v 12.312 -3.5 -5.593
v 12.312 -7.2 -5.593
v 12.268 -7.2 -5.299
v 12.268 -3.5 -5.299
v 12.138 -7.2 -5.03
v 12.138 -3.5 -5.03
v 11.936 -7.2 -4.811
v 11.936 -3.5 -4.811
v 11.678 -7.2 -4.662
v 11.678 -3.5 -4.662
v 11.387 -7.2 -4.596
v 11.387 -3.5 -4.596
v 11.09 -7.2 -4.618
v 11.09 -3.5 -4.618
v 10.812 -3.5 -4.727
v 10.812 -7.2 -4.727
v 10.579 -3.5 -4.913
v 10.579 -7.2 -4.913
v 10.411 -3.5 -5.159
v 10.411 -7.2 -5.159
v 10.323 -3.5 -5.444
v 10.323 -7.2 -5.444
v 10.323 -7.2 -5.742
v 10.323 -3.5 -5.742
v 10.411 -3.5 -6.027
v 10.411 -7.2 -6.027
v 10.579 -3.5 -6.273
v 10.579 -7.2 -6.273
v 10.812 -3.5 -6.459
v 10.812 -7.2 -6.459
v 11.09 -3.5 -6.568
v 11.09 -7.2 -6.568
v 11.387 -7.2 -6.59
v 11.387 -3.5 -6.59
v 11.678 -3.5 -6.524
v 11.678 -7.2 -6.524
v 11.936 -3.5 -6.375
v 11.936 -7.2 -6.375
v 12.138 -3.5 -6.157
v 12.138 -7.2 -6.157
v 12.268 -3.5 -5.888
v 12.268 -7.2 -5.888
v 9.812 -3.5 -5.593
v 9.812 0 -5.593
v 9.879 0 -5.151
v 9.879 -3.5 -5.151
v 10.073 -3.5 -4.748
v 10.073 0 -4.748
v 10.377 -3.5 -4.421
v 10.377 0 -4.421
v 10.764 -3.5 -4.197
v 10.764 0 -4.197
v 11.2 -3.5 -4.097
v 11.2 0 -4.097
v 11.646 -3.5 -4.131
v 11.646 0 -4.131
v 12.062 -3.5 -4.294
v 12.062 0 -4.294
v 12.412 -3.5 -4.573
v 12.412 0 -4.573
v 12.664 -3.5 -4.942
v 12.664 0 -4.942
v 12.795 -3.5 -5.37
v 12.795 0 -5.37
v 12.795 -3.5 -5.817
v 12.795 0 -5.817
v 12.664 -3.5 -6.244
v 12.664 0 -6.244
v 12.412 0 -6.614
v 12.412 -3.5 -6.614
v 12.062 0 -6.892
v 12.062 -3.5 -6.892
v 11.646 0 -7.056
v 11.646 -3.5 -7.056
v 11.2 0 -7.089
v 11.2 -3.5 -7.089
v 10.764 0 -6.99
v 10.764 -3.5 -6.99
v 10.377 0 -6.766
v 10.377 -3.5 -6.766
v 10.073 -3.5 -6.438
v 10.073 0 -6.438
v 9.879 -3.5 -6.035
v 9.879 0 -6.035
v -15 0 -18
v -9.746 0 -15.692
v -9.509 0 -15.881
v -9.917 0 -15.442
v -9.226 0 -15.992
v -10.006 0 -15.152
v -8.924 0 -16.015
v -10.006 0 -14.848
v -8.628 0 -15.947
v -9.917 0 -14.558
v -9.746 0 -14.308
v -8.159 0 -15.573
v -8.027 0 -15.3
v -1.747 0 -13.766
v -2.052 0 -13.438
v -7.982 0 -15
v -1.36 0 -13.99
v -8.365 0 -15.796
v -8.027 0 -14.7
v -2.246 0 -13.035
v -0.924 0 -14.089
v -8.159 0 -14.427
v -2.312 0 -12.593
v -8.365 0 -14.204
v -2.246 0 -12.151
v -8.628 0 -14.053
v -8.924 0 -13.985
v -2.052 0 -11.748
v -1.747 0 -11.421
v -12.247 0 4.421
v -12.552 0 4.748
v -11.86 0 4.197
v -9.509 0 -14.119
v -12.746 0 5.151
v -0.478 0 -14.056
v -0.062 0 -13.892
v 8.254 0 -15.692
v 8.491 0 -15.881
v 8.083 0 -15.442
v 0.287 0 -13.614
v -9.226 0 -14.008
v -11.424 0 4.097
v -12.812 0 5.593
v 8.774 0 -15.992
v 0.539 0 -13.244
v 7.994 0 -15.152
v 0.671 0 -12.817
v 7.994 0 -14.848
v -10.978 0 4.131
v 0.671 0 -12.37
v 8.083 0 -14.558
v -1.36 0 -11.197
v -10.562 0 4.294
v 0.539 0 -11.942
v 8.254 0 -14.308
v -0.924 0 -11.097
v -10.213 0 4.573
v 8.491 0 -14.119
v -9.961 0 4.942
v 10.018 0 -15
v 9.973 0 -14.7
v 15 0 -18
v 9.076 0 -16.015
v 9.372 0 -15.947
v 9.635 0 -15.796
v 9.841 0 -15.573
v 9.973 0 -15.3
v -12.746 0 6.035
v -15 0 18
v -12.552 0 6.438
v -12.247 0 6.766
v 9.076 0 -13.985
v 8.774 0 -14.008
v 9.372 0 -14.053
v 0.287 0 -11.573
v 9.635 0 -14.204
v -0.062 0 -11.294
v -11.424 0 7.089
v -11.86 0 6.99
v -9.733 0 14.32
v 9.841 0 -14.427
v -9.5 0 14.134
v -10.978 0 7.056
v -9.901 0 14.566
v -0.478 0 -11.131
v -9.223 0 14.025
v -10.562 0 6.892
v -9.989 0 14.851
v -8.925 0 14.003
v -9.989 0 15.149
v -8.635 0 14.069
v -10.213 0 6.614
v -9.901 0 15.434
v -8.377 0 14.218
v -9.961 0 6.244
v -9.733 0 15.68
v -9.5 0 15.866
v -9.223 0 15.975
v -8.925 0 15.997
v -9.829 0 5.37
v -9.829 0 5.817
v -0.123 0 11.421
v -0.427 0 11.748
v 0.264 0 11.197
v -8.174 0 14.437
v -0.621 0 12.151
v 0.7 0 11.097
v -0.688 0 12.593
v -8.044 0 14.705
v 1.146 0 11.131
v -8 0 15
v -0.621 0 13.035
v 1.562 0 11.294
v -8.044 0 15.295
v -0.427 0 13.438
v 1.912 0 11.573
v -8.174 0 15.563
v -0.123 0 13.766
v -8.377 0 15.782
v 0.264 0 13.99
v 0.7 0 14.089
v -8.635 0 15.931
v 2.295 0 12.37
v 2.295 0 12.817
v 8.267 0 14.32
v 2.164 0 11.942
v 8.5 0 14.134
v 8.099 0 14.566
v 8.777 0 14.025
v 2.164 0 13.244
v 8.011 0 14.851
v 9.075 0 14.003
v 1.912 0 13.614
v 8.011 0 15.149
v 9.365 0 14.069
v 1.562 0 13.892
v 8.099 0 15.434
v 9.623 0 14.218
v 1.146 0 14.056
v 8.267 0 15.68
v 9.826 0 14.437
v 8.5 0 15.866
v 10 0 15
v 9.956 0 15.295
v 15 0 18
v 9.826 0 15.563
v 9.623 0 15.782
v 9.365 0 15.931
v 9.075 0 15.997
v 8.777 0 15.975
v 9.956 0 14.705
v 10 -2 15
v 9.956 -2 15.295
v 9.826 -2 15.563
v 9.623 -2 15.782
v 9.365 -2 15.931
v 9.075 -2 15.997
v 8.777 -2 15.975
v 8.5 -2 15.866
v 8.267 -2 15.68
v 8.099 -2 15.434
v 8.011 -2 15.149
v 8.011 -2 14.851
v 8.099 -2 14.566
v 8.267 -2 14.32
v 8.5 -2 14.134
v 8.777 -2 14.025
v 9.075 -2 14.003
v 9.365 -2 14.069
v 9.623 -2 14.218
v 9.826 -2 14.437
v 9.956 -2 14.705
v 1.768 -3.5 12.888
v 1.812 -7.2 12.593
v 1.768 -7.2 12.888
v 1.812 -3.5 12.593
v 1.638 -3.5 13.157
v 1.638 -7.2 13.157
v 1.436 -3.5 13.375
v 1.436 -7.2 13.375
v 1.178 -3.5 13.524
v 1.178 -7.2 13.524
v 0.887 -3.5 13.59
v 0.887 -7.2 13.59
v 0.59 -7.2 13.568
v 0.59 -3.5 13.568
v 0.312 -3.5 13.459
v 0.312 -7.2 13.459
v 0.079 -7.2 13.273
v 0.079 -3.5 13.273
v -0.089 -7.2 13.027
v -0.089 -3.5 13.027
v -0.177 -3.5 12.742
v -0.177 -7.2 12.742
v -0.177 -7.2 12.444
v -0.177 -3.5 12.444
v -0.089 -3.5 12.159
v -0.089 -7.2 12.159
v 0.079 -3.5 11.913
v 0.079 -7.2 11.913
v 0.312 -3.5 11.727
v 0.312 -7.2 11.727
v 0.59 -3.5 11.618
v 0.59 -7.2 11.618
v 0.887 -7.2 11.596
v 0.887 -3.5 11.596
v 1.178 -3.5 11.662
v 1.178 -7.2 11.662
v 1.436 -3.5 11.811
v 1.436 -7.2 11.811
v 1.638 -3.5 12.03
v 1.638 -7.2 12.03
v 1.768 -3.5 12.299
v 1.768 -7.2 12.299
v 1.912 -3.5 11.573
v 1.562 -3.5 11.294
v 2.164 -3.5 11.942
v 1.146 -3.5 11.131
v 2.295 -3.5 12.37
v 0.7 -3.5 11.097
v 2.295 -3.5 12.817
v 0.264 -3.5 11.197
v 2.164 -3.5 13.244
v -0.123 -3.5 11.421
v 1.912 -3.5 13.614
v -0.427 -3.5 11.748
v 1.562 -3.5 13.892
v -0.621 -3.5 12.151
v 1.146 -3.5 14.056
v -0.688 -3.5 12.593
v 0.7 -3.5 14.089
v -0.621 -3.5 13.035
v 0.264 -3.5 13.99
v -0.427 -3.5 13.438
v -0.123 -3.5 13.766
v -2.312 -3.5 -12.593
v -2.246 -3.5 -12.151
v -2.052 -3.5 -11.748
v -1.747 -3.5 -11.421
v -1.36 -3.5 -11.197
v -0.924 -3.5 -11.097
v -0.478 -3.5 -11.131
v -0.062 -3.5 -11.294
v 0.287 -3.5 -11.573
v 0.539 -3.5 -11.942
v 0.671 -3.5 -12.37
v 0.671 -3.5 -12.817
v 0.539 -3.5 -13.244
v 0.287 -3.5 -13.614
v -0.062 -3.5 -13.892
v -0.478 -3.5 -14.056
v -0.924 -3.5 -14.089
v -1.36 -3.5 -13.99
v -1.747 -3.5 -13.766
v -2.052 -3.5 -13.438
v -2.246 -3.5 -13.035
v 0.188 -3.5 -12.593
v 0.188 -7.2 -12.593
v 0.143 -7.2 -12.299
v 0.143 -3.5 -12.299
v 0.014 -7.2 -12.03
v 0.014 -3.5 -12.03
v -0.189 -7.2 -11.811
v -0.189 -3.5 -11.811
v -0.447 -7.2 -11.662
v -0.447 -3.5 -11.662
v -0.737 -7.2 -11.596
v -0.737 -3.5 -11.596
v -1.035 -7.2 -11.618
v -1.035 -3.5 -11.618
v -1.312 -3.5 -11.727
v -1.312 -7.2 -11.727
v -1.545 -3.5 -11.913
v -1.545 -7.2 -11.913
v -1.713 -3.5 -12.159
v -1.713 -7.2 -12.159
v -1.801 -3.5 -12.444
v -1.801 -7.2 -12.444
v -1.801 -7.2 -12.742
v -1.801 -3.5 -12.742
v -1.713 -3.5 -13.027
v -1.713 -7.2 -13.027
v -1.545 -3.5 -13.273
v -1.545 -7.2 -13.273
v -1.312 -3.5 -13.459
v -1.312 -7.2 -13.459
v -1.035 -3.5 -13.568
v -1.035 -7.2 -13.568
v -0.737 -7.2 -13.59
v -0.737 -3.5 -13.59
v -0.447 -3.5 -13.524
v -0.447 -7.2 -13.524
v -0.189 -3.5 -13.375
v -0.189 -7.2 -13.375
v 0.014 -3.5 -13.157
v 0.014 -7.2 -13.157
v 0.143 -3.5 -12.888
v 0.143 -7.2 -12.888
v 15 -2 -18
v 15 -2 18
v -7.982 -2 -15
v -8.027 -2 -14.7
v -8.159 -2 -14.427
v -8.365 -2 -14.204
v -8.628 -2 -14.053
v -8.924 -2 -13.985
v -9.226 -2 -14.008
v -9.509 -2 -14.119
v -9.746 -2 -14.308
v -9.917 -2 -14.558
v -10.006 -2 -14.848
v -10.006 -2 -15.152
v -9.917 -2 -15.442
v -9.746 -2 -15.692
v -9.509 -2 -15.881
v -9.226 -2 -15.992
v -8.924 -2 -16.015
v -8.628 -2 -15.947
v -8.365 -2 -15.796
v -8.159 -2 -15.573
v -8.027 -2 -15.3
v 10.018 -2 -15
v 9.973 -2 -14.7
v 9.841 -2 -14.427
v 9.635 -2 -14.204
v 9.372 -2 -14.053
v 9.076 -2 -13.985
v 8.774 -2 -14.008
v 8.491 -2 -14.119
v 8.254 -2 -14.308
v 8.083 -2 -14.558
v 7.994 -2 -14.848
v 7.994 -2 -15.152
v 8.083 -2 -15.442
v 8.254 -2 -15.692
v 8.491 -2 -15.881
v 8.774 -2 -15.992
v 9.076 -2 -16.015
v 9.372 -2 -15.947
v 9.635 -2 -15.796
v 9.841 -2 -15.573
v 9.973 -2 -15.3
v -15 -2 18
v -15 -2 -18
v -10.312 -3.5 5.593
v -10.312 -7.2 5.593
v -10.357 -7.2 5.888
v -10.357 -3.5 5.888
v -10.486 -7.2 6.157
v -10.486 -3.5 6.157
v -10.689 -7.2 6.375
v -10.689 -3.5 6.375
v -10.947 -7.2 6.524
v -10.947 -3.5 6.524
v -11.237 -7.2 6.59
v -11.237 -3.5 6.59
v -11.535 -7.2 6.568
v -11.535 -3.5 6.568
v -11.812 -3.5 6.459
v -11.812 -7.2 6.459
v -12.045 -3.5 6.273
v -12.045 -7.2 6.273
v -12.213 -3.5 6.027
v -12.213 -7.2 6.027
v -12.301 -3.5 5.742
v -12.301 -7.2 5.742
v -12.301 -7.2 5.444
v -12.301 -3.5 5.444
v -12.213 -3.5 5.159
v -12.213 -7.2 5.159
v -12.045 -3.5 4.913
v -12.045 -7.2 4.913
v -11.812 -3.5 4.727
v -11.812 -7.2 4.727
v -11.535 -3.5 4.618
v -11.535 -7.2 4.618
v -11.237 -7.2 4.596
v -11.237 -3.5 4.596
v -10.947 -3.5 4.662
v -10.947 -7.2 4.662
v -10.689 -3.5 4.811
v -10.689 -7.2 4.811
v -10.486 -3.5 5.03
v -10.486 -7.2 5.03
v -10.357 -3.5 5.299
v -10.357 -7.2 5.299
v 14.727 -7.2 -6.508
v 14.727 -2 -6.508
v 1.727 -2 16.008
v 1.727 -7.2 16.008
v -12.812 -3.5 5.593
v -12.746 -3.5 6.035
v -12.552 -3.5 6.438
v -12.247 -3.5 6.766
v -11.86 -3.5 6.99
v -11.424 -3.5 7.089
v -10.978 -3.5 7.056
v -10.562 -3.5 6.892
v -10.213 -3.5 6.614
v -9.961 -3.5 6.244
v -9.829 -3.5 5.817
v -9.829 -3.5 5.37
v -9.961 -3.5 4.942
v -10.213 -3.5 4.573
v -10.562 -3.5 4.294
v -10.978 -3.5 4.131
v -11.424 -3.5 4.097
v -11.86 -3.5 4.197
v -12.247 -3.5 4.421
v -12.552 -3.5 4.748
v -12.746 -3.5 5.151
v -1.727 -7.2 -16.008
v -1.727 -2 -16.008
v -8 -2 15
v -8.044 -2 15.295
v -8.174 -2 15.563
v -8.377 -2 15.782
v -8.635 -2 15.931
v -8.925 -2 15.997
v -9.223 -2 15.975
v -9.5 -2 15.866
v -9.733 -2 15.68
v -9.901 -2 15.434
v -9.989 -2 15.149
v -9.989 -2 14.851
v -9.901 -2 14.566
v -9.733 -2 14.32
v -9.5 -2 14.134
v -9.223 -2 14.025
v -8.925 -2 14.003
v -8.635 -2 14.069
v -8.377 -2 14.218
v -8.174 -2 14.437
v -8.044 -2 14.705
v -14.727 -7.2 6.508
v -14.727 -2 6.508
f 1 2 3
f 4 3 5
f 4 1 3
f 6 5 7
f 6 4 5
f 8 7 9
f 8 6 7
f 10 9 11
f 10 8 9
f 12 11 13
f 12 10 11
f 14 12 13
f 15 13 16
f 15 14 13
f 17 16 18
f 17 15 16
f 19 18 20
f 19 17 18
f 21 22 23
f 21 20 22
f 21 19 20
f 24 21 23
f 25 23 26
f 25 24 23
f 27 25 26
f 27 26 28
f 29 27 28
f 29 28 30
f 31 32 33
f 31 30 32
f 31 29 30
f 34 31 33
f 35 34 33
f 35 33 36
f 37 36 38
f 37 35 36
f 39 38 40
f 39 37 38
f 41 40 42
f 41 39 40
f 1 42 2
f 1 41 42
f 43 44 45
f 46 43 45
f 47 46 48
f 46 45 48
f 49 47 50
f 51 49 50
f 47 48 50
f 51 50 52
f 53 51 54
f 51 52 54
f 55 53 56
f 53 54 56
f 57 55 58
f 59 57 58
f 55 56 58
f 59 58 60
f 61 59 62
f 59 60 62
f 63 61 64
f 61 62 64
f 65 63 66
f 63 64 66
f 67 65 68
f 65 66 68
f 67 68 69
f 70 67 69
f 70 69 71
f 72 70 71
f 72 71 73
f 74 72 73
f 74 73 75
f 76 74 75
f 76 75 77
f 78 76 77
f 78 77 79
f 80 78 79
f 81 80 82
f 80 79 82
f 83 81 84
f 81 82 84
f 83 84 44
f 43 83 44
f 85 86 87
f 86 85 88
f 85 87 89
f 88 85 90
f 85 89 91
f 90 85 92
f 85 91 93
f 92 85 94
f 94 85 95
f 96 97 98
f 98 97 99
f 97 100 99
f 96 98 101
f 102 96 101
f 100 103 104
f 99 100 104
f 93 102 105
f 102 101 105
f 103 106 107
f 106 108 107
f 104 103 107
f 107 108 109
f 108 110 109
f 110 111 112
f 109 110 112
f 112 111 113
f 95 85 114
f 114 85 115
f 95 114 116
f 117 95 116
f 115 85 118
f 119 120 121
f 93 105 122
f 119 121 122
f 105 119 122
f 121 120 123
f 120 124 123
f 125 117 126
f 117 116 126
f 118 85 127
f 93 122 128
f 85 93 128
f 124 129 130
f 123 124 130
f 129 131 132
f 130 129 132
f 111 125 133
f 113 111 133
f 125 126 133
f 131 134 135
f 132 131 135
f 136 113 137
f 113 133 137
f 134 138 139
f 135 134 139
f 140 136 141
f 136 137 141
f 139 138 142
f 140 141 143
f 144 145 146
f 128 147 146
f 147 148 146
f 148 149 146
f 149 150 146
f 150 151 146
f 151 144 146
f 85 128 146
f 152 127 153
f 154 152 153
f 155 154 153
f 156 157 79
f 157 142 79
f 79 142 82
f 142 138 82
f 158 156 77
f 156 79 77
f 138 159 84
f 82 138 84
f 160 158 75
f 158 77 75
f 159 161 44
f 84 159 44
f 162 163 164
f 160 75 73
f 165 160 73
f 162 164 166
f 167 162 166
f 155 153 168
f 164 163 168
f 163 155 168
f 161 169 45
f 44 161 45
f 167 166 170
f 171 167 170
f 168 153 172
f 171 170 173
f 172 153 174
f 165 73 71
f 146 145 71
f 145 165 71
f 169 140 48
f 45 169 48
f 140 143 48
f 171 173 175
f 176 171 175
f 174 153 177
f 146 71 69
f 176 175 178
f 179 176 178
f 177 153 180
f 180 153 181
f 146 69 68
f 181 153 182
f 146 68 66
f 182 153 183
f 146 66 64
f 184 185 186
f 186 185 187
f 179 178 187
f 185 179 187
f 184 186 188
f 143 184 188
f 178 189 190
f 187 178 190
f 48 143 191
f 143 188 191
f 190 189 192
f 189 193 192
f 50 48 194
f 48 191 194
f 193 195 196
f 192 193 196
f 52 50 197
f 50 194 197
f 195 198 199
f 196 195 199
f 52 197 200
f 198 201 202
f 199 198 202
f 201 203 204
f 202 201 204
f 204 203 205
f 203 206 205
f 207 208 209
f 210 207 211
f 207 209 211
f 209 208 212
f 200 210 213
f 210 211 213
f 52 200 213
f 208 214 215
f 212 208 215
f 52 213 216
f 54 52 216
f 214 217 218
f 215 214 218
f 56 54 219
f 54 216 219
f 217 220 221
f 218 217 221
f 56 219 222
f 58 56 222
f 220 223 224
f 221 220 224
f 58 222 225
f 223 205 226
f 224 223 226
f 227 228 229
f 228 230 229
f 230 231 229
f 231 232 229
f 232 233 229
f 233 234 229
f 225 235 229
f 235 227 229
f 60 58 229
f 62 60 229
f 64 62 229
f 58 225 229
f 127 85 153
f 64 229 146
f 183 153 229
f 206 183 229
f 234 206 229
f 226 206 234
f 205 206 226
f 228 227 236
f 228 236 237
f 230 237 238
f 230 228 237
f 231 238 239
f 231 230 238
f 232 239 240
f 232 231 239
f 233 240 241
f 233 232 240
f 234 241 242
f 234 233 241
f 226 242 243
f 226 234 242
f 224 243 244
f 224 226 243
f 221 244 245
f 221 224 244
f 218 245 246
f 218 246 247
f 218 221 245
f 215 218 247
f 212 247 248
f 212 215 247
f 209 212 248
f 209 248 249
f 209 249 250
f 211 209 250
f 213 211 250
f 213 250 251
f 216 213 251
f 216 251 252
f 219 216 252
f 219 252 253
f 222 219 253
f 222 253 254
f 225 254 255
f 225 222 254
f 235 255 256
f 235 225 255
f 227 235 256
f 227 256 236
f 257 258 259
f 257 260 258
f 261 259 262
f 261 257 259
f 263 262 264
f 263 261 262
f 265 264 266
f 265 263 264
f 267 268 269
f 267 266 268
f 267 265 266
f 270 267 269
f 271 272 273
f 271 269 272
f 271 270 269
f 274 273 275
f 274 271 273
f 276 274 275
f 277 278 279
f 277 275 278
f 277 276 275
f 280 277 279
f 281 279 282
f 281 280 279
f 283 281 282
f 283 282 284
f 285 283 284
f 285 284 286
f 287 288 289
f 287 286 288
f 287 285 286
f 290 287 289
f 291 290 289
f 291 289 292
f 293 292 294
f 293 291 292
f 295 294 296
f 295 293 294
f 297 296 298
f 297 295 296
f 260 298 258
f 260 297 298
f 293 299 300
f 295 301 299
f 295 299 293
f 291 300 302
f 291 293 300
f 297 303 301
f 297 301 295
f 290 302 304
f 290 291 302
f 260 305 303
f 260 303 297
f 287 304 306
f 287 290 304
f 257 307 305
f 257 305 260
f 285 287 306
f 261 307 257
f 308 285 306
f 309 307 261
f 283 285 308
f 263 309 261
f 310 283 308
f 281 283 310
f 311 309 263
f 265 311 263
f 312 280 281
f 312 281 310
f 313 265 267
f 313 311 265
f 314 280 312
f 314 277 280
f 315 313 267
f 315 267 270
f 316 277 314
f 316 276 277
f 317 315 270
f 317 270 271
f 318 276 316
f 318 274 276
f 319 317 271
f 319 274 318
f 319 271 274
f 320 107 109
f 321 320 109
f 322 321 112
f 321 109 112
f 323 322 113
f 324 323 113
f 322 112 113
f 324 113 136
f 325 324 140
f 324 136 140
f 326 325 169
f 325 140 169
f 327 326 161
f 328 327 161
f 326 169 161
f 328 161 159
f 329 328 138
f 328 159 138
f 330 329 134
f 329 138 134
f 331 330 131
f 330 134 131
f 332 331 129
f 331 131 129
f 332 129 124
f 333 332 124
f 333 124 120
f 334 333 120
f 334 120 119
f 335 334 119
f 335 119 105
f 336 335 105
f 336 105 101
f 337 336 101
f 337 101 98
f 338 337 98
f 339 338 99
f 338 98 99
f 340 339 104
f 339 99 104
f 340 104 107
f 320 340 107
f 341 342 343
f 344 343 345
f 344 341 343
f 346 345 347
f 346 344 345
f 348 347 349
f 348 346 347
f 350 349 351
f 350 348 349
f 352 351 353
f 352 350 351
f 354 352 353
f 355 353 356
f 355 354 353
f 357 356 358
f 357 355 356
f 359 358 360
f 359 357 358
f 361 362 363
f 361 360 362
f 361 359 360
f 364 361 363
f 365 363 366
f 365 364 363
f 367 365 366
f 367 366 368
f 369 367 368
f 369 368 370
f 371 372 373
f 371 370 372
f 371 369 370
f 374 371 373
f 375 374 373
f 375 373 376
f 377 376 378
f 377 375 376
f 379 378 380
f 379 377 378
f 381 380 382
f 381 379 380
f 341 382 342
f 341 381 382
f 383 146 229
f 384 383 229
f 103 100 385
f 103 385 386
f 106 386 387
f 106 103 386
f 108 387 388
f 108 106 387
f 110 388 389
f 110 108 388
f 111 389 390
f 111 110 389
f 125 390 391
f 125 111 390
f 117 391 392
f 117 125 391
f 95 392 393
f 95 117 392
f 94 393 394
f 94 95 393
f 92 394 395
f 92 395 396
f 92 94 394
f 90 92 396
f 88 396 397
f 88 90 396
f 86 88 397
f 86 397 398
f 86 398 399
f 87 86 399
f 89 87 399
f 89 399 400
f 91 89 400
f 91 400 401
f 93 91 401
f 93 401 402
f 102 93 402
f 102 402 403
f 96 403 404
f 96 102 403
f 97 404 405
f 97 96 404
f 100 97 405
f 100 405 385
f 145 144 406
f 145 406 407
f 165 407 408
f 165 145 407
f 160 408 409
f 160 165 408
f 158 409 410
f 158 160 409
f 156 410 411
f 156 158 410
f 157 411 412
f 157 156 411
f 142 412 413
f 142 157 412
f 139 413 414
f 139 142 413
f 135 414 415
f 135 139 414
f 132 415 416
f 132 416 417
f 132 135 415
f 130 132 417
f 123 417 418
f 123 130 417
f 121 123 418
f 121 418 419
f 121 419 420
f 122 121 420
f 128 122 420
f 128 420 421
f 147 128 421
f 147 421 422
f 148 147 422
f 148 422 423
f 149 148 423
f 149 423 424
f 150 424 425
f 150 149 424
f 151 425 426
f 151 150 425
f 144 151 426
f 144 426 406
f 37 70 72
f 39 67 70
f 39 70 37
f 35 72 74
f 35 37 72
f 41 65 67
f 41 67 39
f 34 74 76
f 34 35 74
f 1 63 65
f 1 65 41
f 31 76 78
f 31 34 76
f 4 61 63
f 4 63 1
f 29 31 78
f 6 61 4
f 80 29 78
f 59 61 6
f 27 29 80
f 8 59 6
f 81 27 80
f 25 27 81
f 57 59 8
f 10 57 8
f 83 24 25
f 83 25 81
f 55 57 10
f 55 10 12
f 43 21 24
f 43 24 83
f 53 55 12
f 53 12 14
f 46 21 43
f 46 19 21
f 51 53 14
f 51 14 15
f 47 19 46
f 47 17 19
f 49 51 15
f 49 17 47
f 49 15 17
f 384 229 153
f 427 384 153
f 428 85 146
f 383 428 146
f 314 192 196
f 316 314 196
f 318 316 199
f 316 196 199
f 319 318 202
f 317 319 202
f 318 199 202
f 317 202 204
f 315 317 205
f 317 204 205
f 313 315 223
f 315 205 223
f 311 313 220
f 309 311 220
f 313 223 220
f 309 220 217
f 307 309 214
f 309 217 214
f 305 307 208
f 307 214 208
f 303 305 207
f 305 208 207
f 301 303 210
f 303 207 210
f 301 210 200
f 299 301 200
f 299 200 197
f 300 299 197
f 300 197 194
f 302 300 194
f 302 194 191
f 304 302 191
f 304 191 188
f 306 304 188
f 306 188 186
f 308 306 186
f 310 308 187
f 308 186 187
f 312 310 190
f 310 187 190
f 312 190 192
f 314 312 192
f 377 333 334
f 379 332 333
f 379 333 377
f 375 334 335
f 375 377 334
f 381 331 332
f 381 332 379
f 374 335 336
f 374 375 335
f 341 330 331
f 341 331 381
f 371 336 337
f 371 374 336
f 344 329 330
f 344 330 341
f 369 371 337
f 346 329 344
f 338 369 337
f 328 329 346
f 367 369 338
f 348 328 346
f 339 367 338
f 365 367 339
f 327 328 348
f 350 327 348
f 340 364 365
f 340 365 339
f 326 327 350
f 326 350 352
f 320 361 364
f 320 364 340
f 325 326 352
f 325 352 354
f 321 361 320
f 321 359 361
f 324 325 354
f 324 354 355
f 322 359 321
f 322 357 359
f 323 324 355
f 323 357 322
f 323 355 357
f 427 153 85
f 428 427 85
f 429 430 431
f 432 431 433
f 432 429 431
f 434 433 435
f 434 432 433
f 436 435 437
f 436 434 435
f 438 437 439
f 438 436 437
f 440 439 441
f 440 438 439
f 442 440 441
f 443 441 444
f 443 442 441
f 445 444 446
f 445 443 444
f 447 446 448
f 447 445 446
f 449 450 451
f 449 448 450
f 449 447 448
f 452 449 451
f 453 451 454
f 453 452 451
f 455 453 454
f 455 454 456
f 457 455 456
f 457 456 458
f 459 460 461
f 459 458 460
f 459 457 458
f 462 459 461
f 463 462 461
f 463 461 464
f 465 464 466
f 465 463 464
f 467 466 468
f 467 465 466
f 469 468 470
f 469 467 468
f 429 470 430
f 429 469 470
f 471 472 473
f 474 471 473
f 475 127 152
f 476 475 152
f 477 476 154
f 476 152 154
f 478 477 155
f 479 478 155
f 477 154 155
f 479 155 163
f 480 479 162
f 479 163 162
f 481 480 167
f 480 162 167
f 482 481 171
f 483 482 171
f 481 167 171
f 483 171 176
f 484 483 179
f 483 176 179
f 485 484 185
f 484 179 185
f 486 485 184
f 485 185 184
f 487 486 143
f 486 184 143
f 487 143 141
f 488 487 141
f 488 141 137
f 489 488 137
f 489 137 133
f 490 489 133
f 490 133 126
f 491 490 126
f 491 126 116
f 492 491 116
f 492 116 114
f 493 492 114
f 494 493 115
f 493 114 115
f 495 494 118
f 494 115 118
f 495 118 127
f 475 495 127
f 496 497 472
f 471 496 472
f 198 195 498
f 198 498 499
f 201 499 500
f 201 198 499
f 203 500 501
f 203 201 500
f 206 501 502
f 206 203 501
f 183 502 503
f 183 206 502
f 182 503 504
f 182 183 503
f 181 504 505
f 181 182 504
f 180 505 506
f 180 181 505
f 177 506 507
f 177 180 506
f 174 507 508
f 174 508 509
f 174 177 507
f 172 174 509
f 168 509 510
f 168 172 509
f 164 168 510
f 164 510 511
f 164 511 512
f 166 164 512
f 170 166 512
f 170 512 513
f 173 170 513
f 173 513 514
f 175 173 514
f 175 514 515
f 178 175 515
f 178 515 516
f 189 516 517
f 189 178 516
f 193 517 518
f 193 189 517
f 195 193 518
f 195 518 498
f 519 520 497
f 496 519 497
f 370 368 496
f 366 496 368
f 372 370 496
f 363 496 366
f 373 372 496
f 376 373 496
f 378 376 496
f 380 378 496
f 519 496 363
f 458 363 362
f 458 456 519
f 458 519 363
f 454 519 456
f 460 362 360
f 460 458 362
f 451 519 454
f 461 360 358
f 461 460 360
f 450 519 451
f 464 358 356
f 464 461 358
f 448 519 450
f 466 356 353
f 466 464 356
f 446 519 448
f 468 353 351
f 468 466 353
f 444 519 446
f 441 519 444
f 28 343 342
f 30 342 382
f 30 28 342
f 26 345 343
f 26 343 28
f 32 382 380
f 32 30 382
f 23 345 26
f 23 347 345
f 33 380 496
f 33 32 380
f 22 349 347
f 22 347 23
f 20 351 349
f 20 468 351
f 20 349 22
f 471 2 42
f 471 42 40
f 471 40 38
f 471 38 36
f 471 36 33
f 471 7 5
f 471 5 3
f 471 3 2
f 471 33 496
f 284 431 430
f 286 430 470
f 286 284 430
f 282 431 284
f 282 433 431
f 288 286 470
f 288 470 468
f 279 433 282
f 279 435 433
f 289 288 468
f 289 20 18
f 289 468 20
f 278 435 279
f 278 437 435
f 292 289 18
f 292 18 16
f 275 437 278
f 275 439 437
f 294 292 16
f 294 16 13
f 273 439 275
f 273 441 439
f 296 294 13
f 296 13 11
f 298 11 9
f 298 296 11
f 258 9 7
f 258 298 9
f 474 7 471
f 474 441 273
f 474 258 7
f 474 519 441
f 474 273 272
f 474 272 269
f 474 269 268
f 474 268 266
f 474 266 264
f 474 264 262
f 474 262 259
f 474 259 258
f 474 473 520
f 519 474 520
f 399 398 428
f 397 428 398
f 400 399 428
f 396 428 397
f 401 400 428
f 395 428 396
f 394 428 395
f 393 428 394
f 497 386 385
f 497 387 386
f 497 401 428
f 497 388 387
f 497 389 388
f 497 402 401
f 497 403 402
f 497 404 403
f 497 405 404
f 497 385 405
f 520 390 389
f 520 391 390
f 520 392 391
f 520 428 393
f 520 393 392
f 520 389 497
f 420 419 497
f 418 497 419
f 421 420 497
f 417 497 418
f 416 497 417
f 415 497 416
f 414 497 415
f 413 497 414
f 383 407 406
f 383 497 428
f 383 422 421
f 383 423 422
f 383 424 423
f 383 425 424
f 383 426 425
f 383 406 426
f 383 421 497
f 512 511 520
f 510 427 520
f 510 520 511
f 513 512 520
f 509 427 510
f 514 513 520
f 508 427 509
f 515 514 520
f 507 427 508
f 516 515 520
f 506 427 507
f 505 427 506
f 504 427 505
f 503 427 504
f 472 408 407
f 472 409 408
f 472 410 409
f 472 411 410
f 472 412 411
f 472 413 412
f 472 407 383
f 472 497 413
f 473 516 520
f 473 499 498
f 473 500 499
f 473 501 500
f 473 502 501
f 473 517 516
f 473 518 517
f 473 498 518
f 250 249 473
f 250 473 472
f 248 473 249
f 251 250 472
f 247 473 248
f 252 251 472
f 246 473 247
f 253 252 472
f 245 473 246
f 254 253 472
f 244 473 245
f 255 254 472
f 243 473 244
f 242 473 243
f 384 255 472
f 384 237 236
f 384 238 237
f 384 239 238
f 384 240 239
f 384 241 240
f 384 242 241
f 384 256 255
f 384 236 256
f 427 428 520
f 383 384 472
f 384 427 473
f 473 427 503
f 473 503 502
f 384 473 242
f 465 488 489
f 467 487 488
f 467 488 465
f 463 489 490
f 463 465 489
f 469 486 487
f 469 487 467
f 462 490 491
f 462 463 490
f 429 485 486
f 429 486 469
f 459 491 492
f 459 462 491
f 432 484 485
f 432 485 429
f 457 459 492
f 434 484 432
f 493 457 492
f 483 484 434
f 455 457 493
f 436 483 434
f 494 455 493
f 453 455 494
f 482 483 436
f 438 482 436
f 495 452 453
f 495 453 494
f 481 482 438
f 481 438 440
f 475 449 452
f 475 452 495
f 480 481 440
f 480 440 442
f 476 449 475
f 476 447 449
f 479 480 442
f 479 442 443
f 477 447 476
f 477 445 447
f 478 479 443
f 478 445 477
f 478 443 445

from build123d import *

# Parameters (mm, degrees)
F0_R     = 1.017764
F0_R_2   = 1
F1_DEPTH = 2
F2_R     = 1
F3_DEPTH = 5.2
F4_R     = 1.5
F4_R_2   = 1
F5_DEPTH = 3.5
F6_R     = 1
F7_DEPTH = 10


with BuildPart() as f1:
    # F0 (on Front) → F1 (new body)
    with BuildSketch(Plane.XZ):
        Polygon((-11.371579, 18), (-15, 18), (-15, -18), (15, -18), (15, 18), (5.371579, 18), align=None)
        with Locations((-9, -15)):
            Circle(F0_R, mode=Mode.SUBTRACT)
        with Locations((-0.812178, -12.593267)):
            Circle(F0_R_2, mode=Mode.SUBTRACT)
        with Locations((9, -15)):
            Circle(F0_R, mode=Mode.SUBTRACT)
        with Locations((11.312178, -5.593267)):
            Circle(F0_R_2, mode=Mode.SUBTRACT)
        with Locations((-11.312178, 5.593267)):
            Circle(F0_R_2, mode=Mode.SUBTRACT)
        with Locations((-9, 15)):
            Circle(F0_R_2, mode=Mode.SUBTRACT)
        with Locations((0.812178, 12.593267)):
            Circle(F0_R_2, mode=Mode.SUBTRACT)
        with Locations((9, 15)):
            Circle(F0_R_2, mode=Mode.SUBTRACT)
    extrude(amount=F1_DEPTH)

    # F2 (on face) → F3 (join)
    with BuildSketch(Plane.XZ.offset(2)):
        with Locations((-11.312178, 5.593267)):
            Circle(F2_R)
        with Locations((-0.812178, -12.593267)):
            Circle(F2_R)
        with Locations((0.812178, 12.593267)):
            Circle(F2_R)
        with Locations((11.312178, -5.593267)):
            Circle(F2_R)
        Polygon((14.727241, -6.50833), (1.727241, 16.00833), (-14.727241, 6.50833), (-1.727241, -16.00833), align=None)
        with Locations((-0.812178, -12.593267)):
            Circle(F2_R, mode=Mode.SUBTRACT)
        with Locations((11.312178, -5.593267)):
            Circle(F2_R, mode=Mode.SUBTRACT)
        with Locations((-11.312178, 5.593267)):
            Circle(F2_R, mode=Mode.SUBTRACT)
        with Locations((0.812178, 12.593267)):
            Circle(F2_R, mode=Mode.SUBTRACT)
    extrude(amount=F3_DEPTH)

    # F4 (on face) → F5 (cut)
    with BuildSketch(Plane(origin=(0, 0, 0), x_dir=(-1, 0, 0), z_dir=(0, 1, 0))):
        with Locations((-11.312178, -5.593267)):
            Circle(F4_R)
        with Locations((-11.312178, -5.593267)):
            Circle(F4_R_2, mode=Mode.SUBTRACT)
        with Locations((0.812178, -12.593267)):
            Circle(F4_R)
        with Locations((0.812178, -12.593267)):
            Circle(F4_R_2, mode=Mode.SUBTRACT)
        with Locations((-0.812178, 12.593267)):
            Circle(F4_R)
        with Locations((-0.812178, 12.593267)):
            Circle(F4_R_2, mode=Mode.SUBTRACT)
        with Locations((11.312178, 5.593267)):
            Circle(F4_R)
        with Locations((11.312178, 5.593267)):
            Circle(F4_R_2, mode=Mode.SUBTRACT)
    extrude(amount=-F5_DEPTH, mode=Mode.SUBTRACT)

    # F6 (on face) → F7 (cut)
    with BuildSketch(Plane(origin=(0, 0, 0), x_dir=(-1, 0, 0), z_dir=(0, 1, 0))):
        with Locations((-0.812178, 12.593267)):
            Circle(F6_R)
        with Locations((11.312178, 5.593267)):
            Circle(F6_R)
        with Locations((0.812178, -12.593267)):
            Circle(F6_R)
        with Locations((-11.312178, -5.593267)):
            Circle(F6_R)
    extrude(amount=-F7_DEPTH, mode=Mode.SUBTRACT)


solid = f1.part
